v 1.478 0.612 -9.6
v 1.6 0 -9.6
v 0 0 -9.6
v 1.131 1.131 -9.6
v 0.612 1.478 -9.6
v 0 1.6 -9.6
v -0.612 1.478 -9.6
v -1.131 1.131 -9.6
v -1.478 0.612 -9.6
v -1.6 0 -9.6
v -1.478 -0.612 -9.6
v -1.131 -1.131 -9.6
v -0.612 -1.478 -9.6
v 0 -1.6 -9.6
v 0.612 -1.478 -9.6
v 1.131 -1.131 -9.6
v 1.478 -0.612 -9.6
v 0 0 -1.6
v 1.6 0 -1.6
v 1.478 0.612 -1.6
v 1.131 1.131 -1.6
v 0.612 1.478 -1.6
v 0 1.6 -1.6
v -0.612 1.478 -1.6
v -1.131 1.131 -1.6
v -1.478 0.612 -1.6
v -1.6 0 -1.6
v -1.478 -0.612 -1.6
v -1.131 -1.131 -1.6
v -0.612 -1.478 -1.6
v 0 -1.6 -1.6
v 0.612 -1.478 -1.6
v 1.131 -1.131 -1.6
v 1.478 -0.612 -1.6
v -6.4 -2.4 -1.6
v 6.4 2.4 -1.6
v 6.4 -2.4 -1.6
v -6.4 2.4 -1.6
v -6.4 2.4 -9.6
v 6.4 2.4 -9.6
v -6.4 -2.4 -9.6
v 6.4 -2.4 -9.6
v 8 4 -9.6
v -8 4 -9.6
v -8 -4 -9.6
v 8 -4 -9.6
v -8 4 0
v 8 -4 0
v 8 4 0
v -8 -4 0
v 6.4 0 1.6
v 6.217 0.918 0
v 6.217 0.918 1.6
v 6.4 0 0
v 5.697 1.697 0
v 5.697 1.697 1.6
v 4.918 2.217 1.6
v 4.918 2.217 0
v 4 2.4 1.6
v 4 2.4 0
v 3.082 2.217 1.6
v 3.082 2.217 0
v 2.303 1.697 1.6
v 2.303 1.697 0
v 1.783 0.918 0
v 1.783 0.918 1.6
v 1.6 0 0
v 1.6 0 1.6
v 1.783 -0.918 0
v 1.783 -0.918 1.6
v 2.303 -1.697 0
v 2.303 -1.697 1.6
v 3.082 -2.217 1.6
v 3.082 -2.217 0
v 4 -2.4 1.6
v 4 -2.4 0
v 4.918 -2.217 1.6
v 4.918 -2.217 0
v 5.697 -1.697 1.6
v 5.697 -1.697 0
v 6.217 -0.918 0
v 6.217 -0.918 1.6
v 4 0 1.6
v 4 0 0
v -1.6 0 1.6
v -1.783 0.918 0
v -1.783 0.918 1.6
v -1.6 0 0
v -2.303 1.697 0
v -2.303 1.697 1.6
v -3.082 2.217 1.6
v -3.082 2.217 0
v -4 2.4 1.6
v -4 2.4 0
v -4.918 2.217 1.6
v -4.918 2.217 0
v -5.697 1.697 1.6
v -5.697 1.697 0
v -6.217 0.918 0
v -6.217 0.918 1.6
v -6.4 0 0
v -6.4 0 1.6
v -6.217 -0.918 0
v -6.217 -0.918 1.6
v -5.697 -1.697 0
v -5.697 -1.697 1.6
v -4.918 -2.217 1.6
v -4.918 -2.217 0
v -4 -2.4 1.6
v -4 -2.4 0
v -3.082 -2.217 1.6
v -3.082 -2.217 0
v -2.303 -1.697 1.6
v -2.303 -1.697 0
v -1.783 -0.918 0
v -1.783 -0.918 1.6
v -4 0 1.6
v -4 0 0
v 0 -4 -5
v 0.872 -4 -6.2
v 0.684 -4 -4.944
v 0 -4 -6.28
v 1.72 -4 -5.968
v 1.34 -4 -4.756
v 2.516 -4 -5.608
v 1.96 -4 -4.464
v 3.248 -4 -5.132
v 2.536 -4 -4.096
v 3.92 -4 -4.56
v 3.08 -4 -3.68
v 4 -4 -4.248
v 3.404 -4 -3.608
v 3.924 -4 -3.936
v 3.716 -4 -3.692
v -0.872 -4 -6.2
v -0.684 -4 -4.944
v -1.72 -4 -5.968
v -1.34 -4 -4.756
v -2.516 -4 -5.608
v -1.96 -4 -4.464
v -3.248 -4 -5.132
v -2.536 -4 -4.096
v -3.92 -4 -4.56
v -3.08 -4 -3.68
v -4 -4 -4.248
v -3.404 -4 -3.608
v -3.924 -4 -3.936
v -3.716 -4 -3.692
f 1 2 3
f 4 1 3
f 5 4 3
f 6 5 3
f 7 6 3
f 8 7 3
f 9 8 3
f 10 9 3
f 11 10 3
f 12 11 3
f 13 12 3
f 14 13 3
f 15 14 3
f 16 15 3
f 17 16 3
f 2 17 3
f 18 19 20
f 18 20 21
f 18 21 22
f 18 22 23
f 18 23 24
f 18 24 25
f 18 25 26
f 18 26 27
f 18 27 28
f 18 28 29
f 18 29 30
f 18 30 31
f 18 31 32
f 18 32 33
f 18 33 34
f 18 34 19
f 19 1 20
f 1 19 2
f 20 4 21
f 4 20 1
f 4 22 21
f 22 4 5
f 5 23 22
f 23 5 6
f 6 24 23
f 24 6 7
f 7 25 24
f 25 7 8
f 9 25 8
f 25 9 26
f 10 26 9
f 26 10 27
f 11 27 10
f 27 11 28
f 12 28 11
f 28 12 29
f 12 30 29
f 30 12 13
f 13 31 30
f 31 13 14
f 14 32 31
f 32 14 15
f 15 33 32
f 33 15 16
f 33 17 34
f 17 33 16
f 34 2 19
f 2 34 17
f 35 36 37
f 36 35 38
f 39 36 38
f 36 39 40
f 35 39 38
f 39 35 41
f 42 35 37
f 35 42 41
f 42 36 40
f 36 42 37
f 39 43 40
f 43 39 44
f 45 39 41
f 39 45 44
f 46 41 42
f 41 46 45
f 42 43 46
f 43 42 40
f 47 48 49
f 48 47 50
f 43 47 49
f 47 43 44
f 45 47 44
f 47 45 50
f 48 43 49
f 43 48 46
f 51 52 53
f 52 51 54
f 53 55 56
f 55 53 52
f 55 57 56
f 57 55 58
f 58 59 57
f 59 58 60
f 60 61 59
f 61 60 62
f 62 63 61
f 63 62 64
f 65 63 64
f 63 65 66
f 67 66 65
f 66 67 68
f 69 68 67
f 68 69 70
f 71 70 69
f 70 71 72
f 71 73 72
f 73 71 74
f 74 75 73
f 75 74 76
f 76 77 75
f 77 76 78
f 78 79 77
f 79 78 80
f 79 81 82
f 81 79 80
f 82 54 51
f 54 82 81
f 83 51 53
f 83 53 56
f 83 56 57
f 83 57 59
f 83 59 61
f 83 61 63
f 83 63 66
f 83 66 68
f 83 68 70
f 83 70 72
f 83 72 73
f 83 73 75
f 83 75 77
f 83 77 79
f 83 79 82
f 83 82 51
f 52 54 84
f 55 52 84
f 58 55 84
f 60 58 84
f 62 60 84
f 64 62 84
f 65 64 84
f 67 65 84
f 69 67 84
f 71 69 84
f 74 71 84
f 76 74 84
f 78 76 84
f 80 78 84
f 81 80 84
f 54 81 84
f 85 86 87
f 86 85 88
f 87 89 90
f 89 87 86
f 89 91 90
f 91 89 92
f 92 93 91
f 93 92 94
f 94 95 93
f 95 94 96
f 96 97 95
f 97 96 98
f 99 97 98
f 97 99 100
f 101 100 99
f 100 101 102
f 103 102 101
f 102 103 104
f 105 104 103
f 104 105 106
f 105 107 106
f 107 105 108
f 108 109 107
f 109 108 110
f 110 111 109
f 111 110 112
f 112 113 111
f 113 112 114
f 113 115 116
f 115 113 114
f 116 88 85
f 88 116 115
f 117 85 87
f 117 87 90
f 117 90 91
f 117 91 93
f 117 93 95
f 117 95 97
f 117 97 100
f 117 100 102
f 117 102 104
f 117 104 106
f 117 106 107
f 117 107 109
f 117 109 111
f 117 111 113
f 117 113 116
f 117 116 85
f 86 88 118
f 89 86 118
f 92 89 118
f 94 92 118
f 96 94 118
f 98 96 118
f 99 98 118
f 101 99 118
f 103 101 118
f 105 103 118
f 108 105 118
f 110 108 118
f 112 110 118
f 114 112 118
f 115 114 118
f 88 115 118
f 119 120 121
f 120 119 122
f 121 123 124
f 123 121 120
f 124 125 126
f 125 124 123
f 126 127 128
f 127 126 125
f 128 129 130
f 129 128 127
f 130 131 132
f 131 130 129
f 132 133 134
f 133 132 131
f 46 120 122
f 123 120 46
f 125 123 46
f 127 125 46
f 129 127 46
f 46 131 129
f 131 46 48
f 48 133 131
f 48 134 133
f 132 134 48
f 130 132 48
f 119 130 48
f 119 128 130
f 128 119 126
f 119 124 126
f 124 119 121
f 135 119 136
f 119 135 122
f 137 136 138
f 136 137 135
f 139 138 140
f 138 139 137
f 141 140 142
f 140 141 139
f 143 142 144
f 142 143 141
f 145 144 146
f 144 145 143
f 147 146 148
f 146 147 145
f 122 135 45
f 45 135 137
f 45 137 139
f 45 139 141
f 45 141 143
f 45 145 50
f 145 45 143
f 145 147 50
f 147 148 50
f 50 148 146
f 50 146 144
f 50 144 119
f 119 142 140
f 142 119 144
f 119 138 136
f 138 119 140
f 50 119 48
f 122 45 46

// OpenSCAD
// file: ../p/4-4edge.scad
use <../lib.scad>
function ldraw_lib__4_4edge() = [
// 0 Circle 1.0
// 0 Name: 4-4edge.dat
// 0 Author: James Jessiman
// 0 !LDRAW_ORG Primitive UPDATE 2017-01
// 0 !LICENSE Licensed under CC BY 2.0 and CC BY 4.0 : see CAreadme.txt
// 
// 0 BFC CERTIFY CCW
  [0,"BFC","CERTIFY"],
  [0,"BFC","CCW"],
// 
// 0 !HISTORY 1998-12-15 [PTadmin] Official Update 1998-10
// 0 !HISTORY 2005-12-28 [PTadmin] Official Update 2005-01
// 0 !HISTORY 2007-06-24 [PTadmin] Header formatted for Contributor Agreement
// 0 !HISTORY 2008-07-01 [PTadmin] Official Update 2008-01
// 0 !HISTORY 2017-01-15 [Steffen] BFCed
// 0 !HISTORY 2017-12-30 [PTadmin] Official Update 2017-01
// 
// 
// 2 24 1 0 0 0.9239 0 0.3827
  [2,24,1,0,0,0.9239,0,0.3827],
// 2 24 0.9239 0 0.3827 0.7071 0 0.7071
  [2,24,0.9239,0,0.3827,0.7071,0,0.7071],
// 2 24 0.7071 0 0.7071 0.3827 0 0.9239
  [2,24,0.7071,0,0.7071,0.3827,0,0.9239],
// 2 24 0.3827 0 0.9239 0 0 1
  [2,24,0.3827,0,0.9239,0,0,1],
// 2 24 0 0 1 -0.3827 0 0.9239
  [2,24,0,0,1,-0.3827,0,0.9239],
// 2 24 -0.3827 0 0.9239 -0.7071 0 0.7071
  [2,24,-0.3827,0,0.9239,-0.7071,0,0.7071],
// 2 24 -0.7071 0 0.7071 -0.9239 0 0.3827
  [2,24,-0.7071,0,0.7071,-0.9239,0,0.3827],
// 2 24 -0.9239 0 0.3827 -1 0 -0
  [2,24,-0.9239,0,0.3827,-1,0,-0],
// 2 24 -1 0 -0 -0.9239 0 -0.3827
  [2,24,-1,0,-0,-0.9239,0,-0.3827],
// 2 24 -0.9239 0 -0.3827 -0.7071 0 -0.7071
  [2,24,-0.9239,0,-0.3827,-0.7071,0,-0.7071],
// 2 24 -0.7071 0 -0.7071 -0.3827 0 -0.9239
  [2,24,-0.7071,0,-0.7071,-0.3827,0,-0.9239],
// 2 24 -0.3827 0 -0.9239 0 0 -1
  [2,24,-0.3827,0,-0.9239,0,0,-1],
// 2 24 0 0 -1 0.3827 0 -0.9239
  [2,24,0,0,-1,0.3827,0,-0.9239],
// 2 24 0.3827 0 -0.9239 0.7071 0 -0.7071
  [2,24,0.3827,0,-0.9239,0.7071,0,-0.7071],
// 2 24 0.7071 0 -0.7071 0.9239 0 -0.3827
  [2,24,0.7071,0,-0.7071,0.9239,0,-0.3827],
// 2 24 0.9239 0 -0.3827 1 0 0
  [2,24,0.9239,0,-0.3827,1,0,0],
];
module ldraw_lib__4_4edge(step=0, col=false, unit=2/5, alt=false, line=0.2, solid=!$preview)
    makepoly(ldraw_lib__4_4edge(), step=step, col=col, unit=unit, alt=alt, line=line, solid=solid);
ldraw_lib__4_4edge(line=0.2);
// file: ../p/4-4disc.scad
use <../lib.scad>
function ldraw_lib__4_4disc() = [
// 0 Disc 1.0
// 0 Name: 4-4disc.dat
// 0 Author: James Jessiman
// 0 !LDRAW_ORG Primitive UPDATE 2002-02
// 0 !LICENSE Licensed under CC BY 2.0 and CC BY 4.0 : see CAreadme.txt
// 
// 0 BFC CERTIFY CCW
  [0,"BFC","CERTIFY"],
  [0,"BFC","CCW"],
// 
// 0 !HISTORY 1998-12-15 [PTadmin] Official Update 1998-10
// 0 !HISTORY 2002-03-23 [sbliss] Added BFC statement
// 0 !HISTORY 2002-04-25 [PTadmin] Official Update 2002-02
// 0 !HISTORY 2007-06-24 [PTadmin] Header formatted for Contributor Agreement
// 0 !HISTORY 2008-07-01 [PTadmin] Official Update 2008-01
// 
// 
// 3 16 0 0 0 1 0 0 0.9239 0 0.3827
  [3,16,0,0,0,1,0,0,0.9239,0,0.3827],
// 3 16 0 0 0 0.9239 0 0.3827 0.7071 0 0.7071
  [3,16,0,0,0,0.9239,0,0.3827,0.7071,0,0.7071],
// 3 16 0 0 0 0.7071 0 0.7071 0.3827 0 0.9239
  [3,16,0,0,0,0.7071,0,0.7071,0.3827,0,0.9239],
// 3 16 0 0 0 0.3827 0 0.9239 0 0 1
  [3,16,0,0,0,0.3827,0,0.9239,0,0,1],
// 3 16 0 0 0 0 0 1 -0.3827 0 0.9239
  [3,16,0,0,0,0,0,1,-0.3827,0,0.9239],
// 3 16 0 0 0 -0.3827 0 0.9239 -0.7071 0 0.7071
  [3,16,0,0,0,-0.3827,0,0.9239,-0.7071,0,0.7071],
// 3 16 0 0 0 -0.7071 0 0.7071 -0.9239 0 0.3827
  [3,16,0,0,0,-0.7071,0,0.7071,-0.9239,0,0.3827],
// 3 16 0 0 0 -0.9239 0 0.3827 -1 0 -0
  [3,16,0,0,0,-0.9239,0,0.3827,-1,0,-0],
// 3 16 0 0 0 -1 0 -0 -0.9239 0 -0.3827
  [3,16,0,0,0,-1,0,-0,-0.9239,0,-0.3827],
// 3 16 0 0 0 -0.9239 0 -0.3827 -0.7071 0 -0.7071
  [3,16,0,0,0,-0.9239,0,-0.3827,-0.7071,0,-0.7071],
// 3 16 0 0 0 -0.7071 0 -0.7071 -0.3827 0 -0.9239
  [3,16,0,0,0,-0.7071,0,-0.7071,-0.3827,0,-0.9239],
// 3 16 0 0 0 -0.3827 0 -0.9239 0 0 -1
  [3,16,0,0,0,-0.3827,0,-0.9239,0,0,-1],
// 3 16 0 0 0 0 0 -1 0.3827 0 -0.9239
  [3,16,0,0,0,0,0,-1,0.3827,0,-0.9239],
// 3 16 0 0 0 0.3827 0 -0.9239 0.7071 0 -0.7071
  [3,16,0,0,0,0.3827,0,-0.9239,0.7071,0,-0.7071],
// 3 16 0 0 0 0.7071 0 -0.7071 0.9239 0 -0.3827
  [3,16,0,0,0,0.7071,0,-0.7071,0.9239,0,-0.3827],
// 3 16 0 0 0 0.9239 0 -0.3827 1 0 0
  [3,16,0,0,0,0.9239,0,-0.3827,1,0,0],
// 0
];
module ldraw_lib__4_4disc(step=0, col=false, unit=2/5, alt=false, line=0.2, solid=!$preview)
    makepoly(ldraw_lib__4_4disc(), step=step, col=col, unit=unit, alt=alt, line=line, solid=solid);
ldraw_lib__4_4disc(line=0.2);
// file: ../p/4-4cyli.scad
use <../lib.scad>
$fa=1; $fs=0.2;
function ldraw_lib__4_4cyli(realsolid=false) = [
// 0 Cylinder 1.0
// 0 Name: 4-4cyli.dat
// 0 Author: James Jessiman
// 0 !LDRAW_ORG Primitive UPDATE 2005-01
// 0 !LICENSE Licensed under CC BY 2.0 and CC BY 4.0 : see CAreadme.txt
// 
// 0 BFC CERTIFY CCW
  [0,"BFC","CERTIFY"],
  [0,"BFC","CCW"],
// 
// 0 !HISTORY 1998-12-15 [PTadmin] Official Update 1998-10
// 0 !HISTORY 2002-03-23 [sbliss] Added BFC statement; merged headers from files in distributions LDraw 0.27 and Complete.
// 0 !HISTORY 2002-04-25 [PTadmin] Official Update 2002-02
// 0 !HISTORY 2004-12-14 [guyvivan] BFC CCW
// 0 !HISTORY 2005-12-28 [PTadmin] Official Update 2005-01
// 0 !HISTORY 2007-06-24 [PTadmin] Header formatted for Contributor Agreement
// 0 !HISTORY 2008-07-01 [PTadmin] Official Update 2008-01
// 
// 
// 4 16 1 1 0 0.9239 1 0.3827 0.9239 0 0.3827 1 0 0
  [4,16,1,1,0,0.9239,1,0.3827,0.9239,0,0.3827,1,0,0],
// 5 24 1 0 0 1 1 0 0.9239 0 0.3827 0.9239 0 -0.3827
  [5,24,1,0,0,1,1,0,0.9239,0,0.3827,0.9239,0,-0.3827],
// 4 16 0.9239 1 0.3827 0.7071 1 0.7071 0.7071 0 0.7071 0.9239 0 0.3827
  [4,16,0.9239,1,0.3827,0.7071,1,0.7071,0.7071,0,0.7071,0.9239,0,0.3827],
// 5 24 0.9239 0 0.3827 0.9239 1 0.3827 0.7071 0 0.7071 1 0 0
  [5,24,0.9239,0,0.3827,0.9239,1,0.3827,0.7071,0,0.7071,1,0,0],
// 4 16 0.7071 1 0.7071 0.3827 1 0.9239 0.3827 0 0.9239 0.7071 0 0.7071
  [4,16,0.7071,1,0.7071,0.3827,1,0.9239,0.3827,0,0.9239,0.7071,0,0.7071],
// 5 24 0.7071 0 0.7071 0.7071 1 0.7071 0.3827 0 0.9239 0.9239 0 0.3827
  [5,24,0.7071,0,0.7071,0.7071,1,0.7071,0.3827,0,0.9239,0.9239,0,0.3827],
// 4 16 0.3827 1 0.9239 0 1 1 0 0 1 0.3827 0 0.9239
  [4,16,0.3827,1,0.9239,0,1,1,0,0,1,0.3827,0,0.9239],
// 5 24 0.3827 0 0.9239 0.3827 1 0.9239 0 0 1 0.7071 0 0.7071
  [5,24,0.3827,0,0.9239,0.3827,1,0.9239,0,0,1,0.7071,0,0.7071],
// 4 16 0 1 1 -0.3827 1 0.9239 -0.3827 0 0.9239 0 0 1
  [4,16,0,1,1,-0.3827,1,0.9239,-0.3827,0,0.9239,0,0,1],
// 5 24 0 0 1 0 1 1 -0.3827 0 0.9239 0.3827 0 0.9239
  [5,24,0,0,1,0,1,1,-0.3827,0,0.9239,0.3827,0,0.9239],
// 4 16 -0.3827 1 0.9239 -0.7071 1 0.7071 -0.7071 0 0.7071 -0.3827 0 0.9239
  [4,16,-0.3827,1,0.9239,-0.7071,1,0.7071,-0.7071,0,0.7071,-0.3827,0,0.9239],
// 5 24 -0.3827 0 0.9239 -0.3827 1 0.9239 -0.7071 0 0.7071 0 0 1
  [5,24,-0.3827,0,0.9239,-0.3827,1,0.9239,-0.7071,0,0.7071,0,0,1],
// 4 16 -0.7071 1 0.7071 -0.9239 1 0.3827 -0.9239 0 0.3827 -0.7071 0 0.7071
  [4,16,-0.7071,1,0.7071,-0.9239,1,0.3827,-0.9239,0,0.3827,-0.7071,0,0.7071],
// 5 24 -0.7071 0 0.7071 -0.7071 1 0.7071 -0.9239 0 0.3827 -0.3827 0 0.9239
  [5,24,-0.7071,0,0.7071,-0.7071,1,0.7071,-0.9239,0,0.3827,-0.3827,0,0.9239],
// 4 16 -0.9239 1 0.3827 -1 1 0 -1 0 0 -0.9239 0 0.3827
  [4,16,-0.9239,1,0.3827,-1,1,0,-1,0,0,-0.9239,0,0.3827],
// 5 24 -0.9239 0 0.3827 -0.9239 1 0.3827 -1 0 0 -0.7071 0 0.7071
  [5,24,-0.9239,0,0.3827,-0.9239,1,0.3827,-1,0,0,-0.7071,0,0.7071],
// 4 16 -1 1 0 -0.9239 1 -0.3827 -0.9239 0 -0.3827 -1 0 0
  [4,16,-1,1,0,-0.9239,1,-0.3827,-0.9239,0,-0.3827,-1,0,0],
// 5 24 -1 0 0 -1 1 0 -0.9239 0 -0.3827 -0.9239 0 0.3827
  [5,24,-1,0,0,-1,1,0,-0.9239,0,-0.3827,-0.9239,0,0.3827],
// 4 16 -0.9239 1 -0.3827 -0.7071 1 -0.7071 -0.7071 0 -0.7071 -0.9239 0 -0.3827
  [4,16,-0.9239,1,-0.3827,-0.7071,1,-0.7071,-0.7071,0,-0.7071,-0.9239,0,-0.3827],
// 5 24 -0.9239 0 -0.3827 -0.9239 1 -0.3827 -0.7071 0 -0.7071 -1 0 0
  [5,24,-0.9239,0,-0.3827,-0.9239,1,-0.3827,-0.7071,0,-0.7071,-1,0,0],
// 4 16 -0.7071 1 -0.7071 -0.3827 1 -0.9239 -0.3827 0 -0.9239 -0.7071 0 -0.7071
  [4,16,-0.7071,1,-0.7071,-0.3827,1,-0.9239,-0.3827,0,-0.9239,-0.7071,0,-0.7071],
// 5 24 -0.7071 0 -0.7071 -0.7071 1 -0.7071 -0.3827 0 -0.9239 -0.9239 0 -0.3827
  [5,24,-0.7071,0,-0.7071,-0.7071,1,-0.7071,-0.3827,0,-0.9239,-0.9239,0,-0.3827],
// 4 16 -0.3827 1 -0.9239 0 1 -1 0 0 -1 -0.3827 0 -0.9239
  [4,16,-0.3827,1,-0.9239,0,1,-1,0,0,-1,-0.3827,0,-0.9239],
// 5 24 -0.3827 0 -0.9239 -0.3827 1 -0.9239 0 0 -1 -0.7071 0 -0.7071
  [5,24,-0.3827,0,-0.9239,-0.3827,1,-0.9239,0,0,-1,-0.7071,0,-0.7071],
// 4 16 0 1 -1 0.3827 1 -0.9239 0.3827 0 -0.9239 0 0 -1
  [4,16,0,1,-1,0.3827,1,-0.9239,0.3827,0,-0.9239,0,0,-1],
// 5 24 0 0 -1 0 1 -1 0.3827 0 -0.9239 -0.3827 0 -0.9239
  [5,24,0,0,-1,0,1,-1,0.3827,0,-0.9239,-0.3827,0,-0.9239],
// 4 16 0.3827 1 -0.9239 0.7071 1 -0.7071 0.7071 0 -0.7071 0.3827 0 -0.9239
  [4,16,0.3827,1,-0.9239,0.7071,1,-0.7071,0.7071,0,-0.7071,0.3827,0,-0.9239],
// 5 24 0.3827 0 -0.9239 0.3827 1 -0.9239 0.7071 0 -0.7071 0 0 -1
  [5,24,0.3827,0,-0.9239,0.3827,1,-0.9239,0.7071,0,-0.7071,0,0,-1],
// 4 16 0.7071 1 -0.7071 0.9239 1 -0.3827 0.9239 0 -0.3827 0.7071 0 -0.7071
  [4,16,0.7071,1,-0.7071,0.9239,1,-0.3827,0.9239,0,-0.3827,0.7071,0,-0.7071],
// 5 24 0.7071 0 -0.7071 0.7071 1 -0.7071 0.9239 0 -0.3827 0.3827 0 -0.9239
  [5,24,0.7071,0,-0.7071,0.7071,1,-0.7071,0.9239,0,-0.3827,0.3827,0,-0.9239],
// 4 16 0.9239 1 -0.3827 1 1 0 1 0 0 0.9239 0 -0.3827
  [4,16,0.9239,1,-0.3827,1,1,0,1,0,0,0.9239,0,-0.3827],
// 5 24 0.9239 0 -0.3827 0.9239 1 -0.3827 1 0 0 0.7071 0 -0.7071
  [5,24,0.9239,0,-0.3827,0.9239,1,-0.3827,1,0,0,0.7071,0,-0.7071],
// 0
];
module ldraw_lib__4_4cyli(step=0, col=false, unit=2/5, alt=false, line=0.2, solid=!$preview)
    makepoly(ldraw_lib__4_4cyli(solid), step=step, col=col, unit=unit, alt=alt, line=line, solid=solid);
ldraw_lib__4_4cyli(line=0.2);
// file: ../p/stud3.scad
use <../lib.scad>
use <4-4cyli.scad>
use <4-4disc.scad>
use <4-4edge.scad>
function ldraw_lib__stud3() = [
// 0 Stud Tube Solid
// 0 Name: stud3.dat
// 0 Author: James Jessiman
// 0 !LDRAW_ORG Primitive UPDATE 2012-01
// 0 !LICENSE Licensed under CC BY 4.0 : see CAreadme.txt
// 
// 0 BFC CERTIFY CCW
  [0,"BFC","CERTIFY"],
  [0,"BFC","CCW"],
// 
// 0 !HISTORY 2002-04-04 [sbliss] Modified for BFC compliance
// 0 !HISTORY 2002-04-25 [PTadmin] Official Update 2002-02
// 0 !HISTORY 2007-06-24 [PTadmin] Header formatted for Contributor Agreement
// 0 !HISTORY 2008-07-01 [PTadmin] Official Update 2008-01
// 0 !HISTORY 2012-02-16 [Philo] Changed to CCW
// 0 !HISTORY 2012-03-30 [PTadmin] Official Update 2012-01
// 
// 
// 1 16 0 -4 0 4 0 0 0 1 0 0 0 4 4-4edge.dat
  [1,16,0,-4,0,4,0,0,0,1,0,0,0,4, ldraw_lib__4_4edge()],
// 1 16 0 0 0 4 0 0 0 1 0 0 0 4 4-4edge.dat
  [1,16,0,0,0,4,0,0,0,1,0,0,0,4, ldraw_lib__4_4edge()],
// 1 16 0 -4 0 4 0 0 0 1 0 0 0 4 4-4disc.dat
  [1,16,0,-4,0,4,0,0,0,1,0,0,0,4, ldraw_lib__4_4disc()],
  [-1,16,0,0,0,4,0,0,0,-1,0,0,0,4, ldraw_lib__4_4disc()],
// 1 16 0 -4 0 4 0 0 0 4 0 0 0 4 4-4cyli.dat
  [1,16,0,-4,0,4,0,0,0,4,0,0,0,4, ldraw_lib__4_4cyli()],
];
module ldraw_lib__stud3(step=0, col=false, unit=2/5, alt=false, line=0.2, solid=!$preview)
    makepoly(ldraw_lib__stud3(), step=step, col=col, unit=unit, alt=alt, line=line, solid=solid);
ldraw_lib__stud3(line=0.2);
// file: ../p/stud.scad
use <../lib.scad>
use <4-4cyli.scad>
use <4-4disc.scad>
use <4-4edge.scad>
function ldraw_lib__stud() = [
// 0 Stud
// 0 Name: stud.dat
// 0 Author: James Jessiman
// 0 !LDRAW_ORG Primitive UPDATE 2012-01
// 0 !LICENSE Licensed under CC BY 4.0 : see CAreadme.txt
// 
// 0 BFC CERTIFY CCW
  [0,"BFC","CERTIFY"],
  [0,"BFC","CCW"],
// 
// 0 !HISTORY 2002-04-04 [sbliss] Modified for BFC compliance
// 0 !HISTORY 2002-04-25 [PTadmin] Official Update 2002-02
// 0 !HISTORY 2007-06-24 [PTadmin] Header formatted for Contributor Agreement
// 0 !HISTORY 2008-07-01 [PTadmin] Official Update 2008-01
// 0 !HISTORY 2012-02-16 [Philo] Changed to CCW
// 0 !HISTORY 2012-03-30 [PTadmin] Official Update 2012-01
// 
// 
// 1 16 0 0 0 6 0 0 0 1 0 0 0 6 4-4edge.dat
  [1,16,0,0,0,6,0,0,0,1,0,0,0,6, ldraw_lib__4_4edge()],
// 1 16 0 -4 0 6 0 0 0 1 0 0 0 6 4-4edge.dat
  [1,16,0,-4,0,6,0,0,0,1,0,0,0,6, ldraw_lib__4_4edge()],
// 1 16 0 0 0 6 0 0 0 -4 0 0 0 6 4-4cyli.dat
  [1,16,0,0,0,6,0,0,0,-4,0,0,0,6, ldraw_lib__4_4cyli()],
// 1 16 0 -4 0 6 0 0 0 1 0 0 0 6 4-4disc.dat
  [1,16,0,-4,0,6,0,0,0,1,0,0,0,6, ldraw_lib__4_4disc()],
  [-1,16,0,0,0,6,0,0,0,-1,0,0,0,6, ldraw_lib__4_4disc()],
];
module ldraw_lib__stud(step=0, col=false, unit=2/5, alt=false, line=0.2, solid=!$preview)
    makepoly(ldraw_lib__stud(), step=step, col=col, unit=unit, alt=alt, line=line, solid=solid);
ldraw_lib__stud(line=0.2);
// file: ../p/box5.scad
use <../lib.scad>
function ldraw_lib__box5() = [
// 0 Box with 5 Faces and All Edges
// 0 Name: box5.dat
// 0 Author: James Jessiman
// 0 !LDRAW_ORG Primitive UPDATE 2012-01
// 0 !LICENSE Licensed under CC BY 2.0 and CC BY 4.0 : see CAreadme.txt
// 
// 0 BFC CERTIFY CCW
  [0,"BFC","CERTIFY"],
  [0,"BFC","CCW"],
// 
// 0 !HISTORY 2002-04-03 [sbliss] Modified for BFC compliance
// 0 !HISTORY 2002-04-25 [PTadmin] Official Update 2002-02
// 0 !HISTORY 2007-06-24 [PTadmin] Header formatted for Contributor Agreement
// 0 !HISTORY 2008-07-01 [PTadmin] Official Update 2008-01
// 0 !HISTORY 2012-02-16 [Philo] Changed to CCW
// 0 !HISTORY 2012-03-30 [PTadmin] Official Update 2012-01
// 
// 
// 2 24 1 1 1 -1 1 1
  [2,24,1,1,1,-1,1,1],
// 2 24 -1 1 1 -1 1 -1
  [2,24,-1,1,1,-1,1,-1],
// 2 24 -1 1 -1 1 1 -1
  [2,24,-1,1,-1,1,1,-1],
// 2 24 1 1 -1 1 1 1
  [2,24,1,1,-1,1,1,1],
// 2 24 1 0 1 -1 0 1
  [2,24,1,0,1,-1,0,1],
// 2 24 -1 0 1 -1 0 -1
  [2,24,-1,0,1,-1,0,-1],
// 2 24 -1 0 -1 1 0 -1
  [2,24,-1,0,-1,1,0,-1],
// 2 24 1 0 -1 1 0 1
  [2,24,1,0,-1,1,0,1],
// 2 24 1 0 1 1 1 1
  [2,24,1,0,1,1,1,1],
// 2 24 -1 0 1 -1 1 1
  [2,24,-1,0,1,-1,1,1],
// 2 24 1 0 -1 1 1 -1
  [2,24,1,0,-1,1,1,-1],
// 2 24 -1 0 -1 -1 1 -1
  [2,24,-1,0,-1,-1,1,-1],
// 4 16 -1 1 1 1 1 1 1 1 -1 -1 1 -1
  [4,16,-1,1,1,1,1,1,1,1,-1,-1,1,-1],
// 4 16 -1 1 1 -1 0 1 1 0 1 1 1 1
  [4,16,-1,1,1,-1,0,1,1,0,1,1,1,1],
// 4 16 -1 1 -1 -1 0 -1 -1 0 1 -1 1 1
  [4,16,-1,1,-1,-1,0,-1,-1,0,1,-1,1,1],
// 4 16 1 1 -1 1 0 -1 -1 0 -1 -1 1 -1
  [4,16,1,1,-1,1,0,-1,-1,0,-1,-1,1,-1],
// 4 16 1 1 1 1 0 1 1 0 -1 1 1 -1
  [4,16,1,1,1,1,0,1,1,0,-1,1,1,-1],
];
makepoly(ldraw_lib__box5(), line=0.2);
// file: ../p/box4t.scad
use <../lib.scad>
function ldraw_lib__box4t() = [
// 0 Box with 4 Adjacent Faces and All Edges
// 0 Name: box4t.dat
// 0 Author: Tore Eriksson [Tore_Eriksson]
// 0 !LDRAW_ORG Primitive UPDATE 2003-02
// 0 !LICENSE Licensed under CC BY 2.0 and CC BY 4.0 : see CAreadme.txt
// 
// 0 BFC CERTIFY CCW
  [0,"BFC","CERTIFY"],
  [0,"BFC","CCW"],
// 
// 0 !HISTORY 1997-09-29 [PTadmin] Official Update 1997-15
// 0 !HISTORY 2002-08-31 [izanette] Modified with WINDZ for BFC compliance
// 0 !HISTORY 2003-08-01 [PTadmin] Official Update 2003-02
// 0 !HISTORY 2007-06-24 [PTadmin] Header formatted for Contributor Agreement
// 0 !HISTORY 2008-07-01 [PTadmin] Official Update 2008-01
// 
// 
// 2 24 1 1 1 -1 1 1
  [2,24,1,1,1,-1,1,1],
// 2 24 -1 1 1 -1 1 -1
  [2,24,-1,1,1,-1,1,-1],
// 2 24 -1 1 -1 1 1 -1
  [2,24,-1,1,-1,1,1,-1],
// 2 24 1 1 -1 1 1 1
  [2,24,1,1,-1,1,1,1],
// 2 24 1 0 1 -1 0 1
  [2,24,1,0,1,-1,0,1],
// 2 24 -1 0 1 -1 0 -1
  [2,24,-1,0,1,-1,0,-1],
// 2 24 -1 0 -1 1 0 -1
  [2,24,-1,0,-1,1,0,-1],
// 2 24 1 0 -1 1 0 1
  [2,24,1,0,-1,1,0,1],
// 2 24 1 0 1 1 1 1
  [2,24,1,0,1,1,1,1],
// 2 24 -1 0 1 -1 1 1
  [2,24,-1,0,1,-1,1,1],
// 2 24 1 0 -1 1 1 -1
  [2,24,1,0,-1,1,1,-1],
// 2 24 -1 0 -1 -1 1 -1
  [2,24,-1,0,-1,-1,1,-1],
// 4 16 1 1 1 1 1 -1 -1 1 -1 -1 1 1
  [4,16,1,1,1,1,1,-1,-1,1,-1,-1,1,1],
// 4 16 1 1 1 -1 1 1 -1 0 1 1 0 1
  [4,16,1,1,1,-1,1,1,-1,0,1,1,0,1],
// 4 16 -1 1 1 -1 1 -1 -1 0 -1 -1 0 1
  [4,16,-1,1,1,-1,1,-1,-1,0,-1,-1,0,1],
// 0 4 16 -1 1 -1 -1 0 -1 1 0 -1 1 1 -1
// 4 16 1 1 -1 1 1 1 1 0 1 1 0 -1
  [4,16,1,1,-1,1,1,1,1,0,1,1,0,-1],
// 0
];
makepoly(ldraw_lib__box4t(), line=0.2);
// file: s/3004s01.scad
use <../../lib.scad>
use <../../p/box4t.scad>
use <../../p/box5.scad>
use <../../p/stud.scad>
use <../../p/stud3.scad>
$fa=1; $fs=0.2;
function ldraw_lib__s__3004s01(realsolid=false) = [
// 0 ~Brick  1 x  2 without Front Face
// 0 Name: s\3004s01.dat
// 0 Author: James Jessiman
// 0 !LDRAW_ORG Subpart UPDATE 2003-03
// 0 !LICENSE Licensed under CC BY 2.0 and CC BY 4.0 : see CAreadme.txt
// 
// 0 BFC CERTIFY CCW
  [0,"BFC","CERTIFY"],
  [0,"BFC","CCW"],
// 
// 0 !HISTORY 2003-09-07 [jriley] Subfiling, BFC
// 0 !HISTORY 2003-12-19 [PTadmin] Official Update 2003-03
// 0 !HISTORY 2007-08-29 [PTadmin] Header formatted for Contributor Agreement
// 0 !HISTORY 2008-07-01 [PTadmin] Official Update 2008-01
// 
// 
// 1 16 0 4 0 1 0 0 0 -5 0 0 0 1 stud3.dat
  [1,16,0,4,0,1,0,0,0,-5,0,0,0,1, ldraw_lib__stud3(realsolid)],
// 0 BFC INVERTNEXT
  [0,"BFC","INVERTNEXT"],
// 1 16 0 24 0 16 0 0 0 -20 0 0 0 6 box5.dat
  [1,16,0,24,0,16,0,0,0,-20,0,0,0,6, ldraw_lib__box5(realsolid)],
// 4 16 20 24 10 16 24 6 -16 24 6 -20 24 10
  [4,16,20,24,10,16,24,6,-16,24,6,-20,24,10],
// 4 16 -20 24 10 -16 24 6 -16 24 -6 -20 24 -10
  [4,16,-20,24,10,-16,24,6,-16,24,-6,-20,24,-10],
// 4 16 -20 24 -10 -16 24 -6 16 24 -6 20 24 -10
  [4,16,-20,24,-10,-16,24,-6,16,24,-6,20,24,-10],
// 4 16 20 24 -10 16 24 -6 16 24 6 20 24 10
  [4,16,20,24,-10,16,24,-6,16,24,6,20,24,10],
// 1 16 0 24 0 20 0 0 0 -24 0 0 0 10 box4t.dat
  [1,16,0,24,0,20,0,0,0,-24,0,0,0,10, ldraw_lib__box4t(realsolid)],
// 1 16 10 0 0 1 0 0 0 1 0 0 0 1 stud.dat
  [1,16,10,0,0,1,0,0,0,1,0,0,0,1, ldraw_lib__stud(realsolid)],
// 1 16 -10 0 0 1 0 0 0 1 0 0 0 1 stud.dat
  [1,16,-10,0,0,1,0,0,0,1,0,0,0,1, ldraw_lib__stud(realsolid)],
// 0
];
module ldraw_lib__s__3004s01(step=0, col=false, unit=2/5, alt=false, line=0.2, solid=!$preview)
    makepoly(ldraw_lib__s__3004s01(solid), step=step, col=col, unit=unit, alt=alt, line=line, solid=solid);
ldraw_lib__s__3004s01(line=0.2);
// file: s/3004p0gs01.scad
use <../../lib.scad>
function ldraw_lib__s__3004p0gs01() = [
// 0 ~Brick  1 x  2 with Black Smile Pattern Half
// 0 Name: s\3004p0gs01.dat
// 0 Author: Rene Rechthaler [Blechtaler]
// 0 !LDRAW_ORG Subpart UPDATE 2025-06
// 0 !LICENSE Licensed under CC BY 4.0 : see CAreadme.txt
// 
// 0 BFC CERTIFY CCW
  [0,"BFC","CERTIFY"],
  [0,"BFC","CCW"],
// 
// 0 !HISTORY 2025-04-10 [Blechtaler] made from 3004p0g by [Berth], added BFC NOCLIP
// 0 !HISTORY 2025-06-26 [OrionP] Official Update 2025-06
// 
// 0 BFC NOCLIP
  [0,"BFC","NOCLIP"],
// 4 0 2.18 15.5 -10 1.71 12.36 -10 0 12.5 -10 0 15.7 -10
  [4,0,2.18,15.5,-10,1.71,12.36,-10,0,12.5,-10,0,15.7,-10],
// 4 0 2.18 15.5 -10 4.3 14.92 -10 3.35 11.89 -10 1.71 12.36 -10
  [4,0,2.18,15.5,-10,4.3,14.92,-10,3.35,11.89,-10,1.71,12.36,-10],
// 4 0 4.3 14.92 -10 6.29 14.02 -10 4.9 11.16 -10 3.35 11.89 -10
  [4,0,4.3,14.92,-10,6.29,14.02,-10,4.9,11.16,-10,3.35,11.89,-10],
// 4 0 6.29 14.02 -10 8.12 12.83 -10 6.34 10.24 -10 4.9 11.16 -10
  [4,0,6.29,14.02,-10,8.12,12.83,-10,6.34,10.24,-10,4.9,11.16,-10],
// 4 0 7.7 9.2 -10 6.34 10.24 -10 8.12 12.83 -10 9.8 11.4 -10
  [4,0,7.7,9.2,-10,6.34,10.24,-10,8.12,12.83,-10,9.8,11.4,-10],
// 4 0 7.7 9.2 -10 9.8 11.4 -10 10 10.62 -10 8.51 9.02 -10
  [4,0,7.7,9.2,-10,9.8,11.4,-10,10,10.62,-10,8.51,9.02,-10],
// 4 0 9.29 9.23 -10 8.51 9.02 -10 10 10.62 -10 9.81 9.84 -10
  [4,0,9.29,9.23,-10,8.51,9.02,-10,10,10.62,-10,9.81,9.84,-10],
// 0 BFC CLIP
  [0,"BFC","CLIP"],
// 3 16 20 24 -10 2.18 15.5 -10 0 15.7 -10
  [3,16,20,24,-10,2.18,15.5,-10,0,15.7,-10],
// 3 16 4.3 14.92 -10 2.18 15.5 -10 20 24 -10
  [3,16,4.3,14.92,-10,2.18,15.5,-10,20,24,-10],
// 3 16 6.29 14.02 -10 4.3 14.92 -10 20 24 -10
  [3,16,6.29,14.02,-10,4.3,14.92,-10,20,24,-10],
// 3 16 8.12 12.83 -10 6.29 14.02 -10 20 24 -10
  [3,16,8.12,12.83,-10,6.29,14.02,-10,20,24,-10],
// 3 16 9.8 11.4 -10 8.12 12.83 -10 20 24 -10
  [3,16,9.8,11.4,-10,8.12,12.83,-10,20,24,-10],
// 4 16 9.8 11.4 -10 20 24 -10 20 0 -10 10 10.62 -10
  [4,16,9.8,11.4,-10,20,24,-10,20,0,-10,10,10.62,-10],
// 3 16 20 0 -10 9.81 9.84 -10 10 10.62 -10
  [3,16,20,0,-10,9.81,9.84,-10,10,10.62,-10],
// 3 16 20 0 -10 9.29 9.23 -10 9.81 9.84 -10
  [3,16,20,0,-10,9.29,9.23,-10,9.81,9.84,-10],
// 3 16 8.51 9.02 -10 9.29 9.23 -10 20 0 -10
  [3,16,8.51,9.02,-10,9.29,9.23,-10,20,0,-10],
// 3 16 7.7 9.2 -10 8.51 9.02 -10 20 0 -10
  [3,16,7.7,9.2,-10,8.51,9.02,-10,20,0,-10],
// 3 16 0 12.5 -10 7.7 9.2 -10 20 0 -10
  [3,16,0,12.5,-10,7.7,9.2,-10,20,0,-10],
// 4 16 7.7 9.2 -10 0 12.5 -10 4.9 11.16 -10 6.34 10.24 -10
  [4,16,7.7,9.2,-10,0,12.5,-10,4.9,11.16,-10,6.34,10.24,-10],
// 4 16 1.71 12.36 -10 3.35 11.89 -10 4.9 11.16 -10 0 12.5 -10
  [4,16,1.71,12.36,-10,3.35,11.89,-10,4.9,11.16,-10,0,12.5,-10],
];
module ldraw_lib__s__3004p0gs01(step=0, col=false, unit=2/5, alt=false, line=0.2, solid=!$preview)
    makepoly(ldraw_lib__s__3004p0gs01(), step=step, col=col, unit=unit, alt=alt, line=line, solid=solid);
ldraw_lib__s__3004p0gs01(line=0.2);
// main file
use <../lib.scad>
use <s/3004p0gs01.scad>
use <s/3004s01.scad>
function ldraw_lib__3004p0g() = [
// 0 Brick  1 x  2 with Black Smile Pattern
// 0 Name: 3004p0g.dat
// 0 Author: Bertrand Lequy [Berth]
// 0 !LDRAW_ORG Part UPDATE 2025-06
// 0 !LICENSE Licensed under CC BY 4.0 : see CAreadme.txt
// 
// 0 BFC CERTIFY CCW
  [0,"BFC","CERTIFY"],
  [0,"BFC","CCW"],
// 
// 0 !KEYWORDS Bricklink 3004pb302, Rebrickable 3004pr0103, Set 11027, Set 11028
// 0 !KEYWORDS Set 11033, set 11037, set 66745
// 
// 0 !HISTORY 2024-08-26 [OrionP] Official Update 2024-07
// 0 !HISTORY 2025-04-10 [Blechtaler] subfiled the pattern
// 0 !HISTORY 2025-06-26 [OrionP] Official Update 2025-06
// 
// 1 16 0 0 0 1 0 0 0 1 0 0 0 1 s\3004s01.dat
  [1,16,0,0,0,1,0,0,0,1,0,0,0,1, ldraw_lib__s__3004s01()],
// 1 16 0 0 0 1 0 0 0 1 0 0 0 1 s\3004p0gs01.dat
  [1,16,0,0,0,1,0,0,0,1,0,0,0,1, ldraw_lib__s__3004p0gs01()],
// 1 16 0 0 0 -1 0 0 0 1 0 0 0 1 s\3004p0gs01.dat
  [1,16,0,0,0,-1,0,0,0,1,0,0,0,1, ldraw_lib__s__3004p0gs01()],
// 3 16 -20 0 -10 0 12.5 -10 20 0 -10
  [3,16,-20,0,-10,0,12.5,-10,20,0,-10],
// 3 16 0 15.7 -10 -20 24 -10 20 24 -10
  [3,16,0,15.7,-10,-20,24,-10,20,24,-10],
];
module ldraw_lib__3004p0g(step=0, col=false, unit=2/5, alt=false, line=0.2, solid=!$preview)
    makepoly(ldraw_lib__3004p0g(), step=step, col=col, unit=unit, alt=alt, line=line, solid=solid);
ldraw_lib__3004p0g(line=0.2);
